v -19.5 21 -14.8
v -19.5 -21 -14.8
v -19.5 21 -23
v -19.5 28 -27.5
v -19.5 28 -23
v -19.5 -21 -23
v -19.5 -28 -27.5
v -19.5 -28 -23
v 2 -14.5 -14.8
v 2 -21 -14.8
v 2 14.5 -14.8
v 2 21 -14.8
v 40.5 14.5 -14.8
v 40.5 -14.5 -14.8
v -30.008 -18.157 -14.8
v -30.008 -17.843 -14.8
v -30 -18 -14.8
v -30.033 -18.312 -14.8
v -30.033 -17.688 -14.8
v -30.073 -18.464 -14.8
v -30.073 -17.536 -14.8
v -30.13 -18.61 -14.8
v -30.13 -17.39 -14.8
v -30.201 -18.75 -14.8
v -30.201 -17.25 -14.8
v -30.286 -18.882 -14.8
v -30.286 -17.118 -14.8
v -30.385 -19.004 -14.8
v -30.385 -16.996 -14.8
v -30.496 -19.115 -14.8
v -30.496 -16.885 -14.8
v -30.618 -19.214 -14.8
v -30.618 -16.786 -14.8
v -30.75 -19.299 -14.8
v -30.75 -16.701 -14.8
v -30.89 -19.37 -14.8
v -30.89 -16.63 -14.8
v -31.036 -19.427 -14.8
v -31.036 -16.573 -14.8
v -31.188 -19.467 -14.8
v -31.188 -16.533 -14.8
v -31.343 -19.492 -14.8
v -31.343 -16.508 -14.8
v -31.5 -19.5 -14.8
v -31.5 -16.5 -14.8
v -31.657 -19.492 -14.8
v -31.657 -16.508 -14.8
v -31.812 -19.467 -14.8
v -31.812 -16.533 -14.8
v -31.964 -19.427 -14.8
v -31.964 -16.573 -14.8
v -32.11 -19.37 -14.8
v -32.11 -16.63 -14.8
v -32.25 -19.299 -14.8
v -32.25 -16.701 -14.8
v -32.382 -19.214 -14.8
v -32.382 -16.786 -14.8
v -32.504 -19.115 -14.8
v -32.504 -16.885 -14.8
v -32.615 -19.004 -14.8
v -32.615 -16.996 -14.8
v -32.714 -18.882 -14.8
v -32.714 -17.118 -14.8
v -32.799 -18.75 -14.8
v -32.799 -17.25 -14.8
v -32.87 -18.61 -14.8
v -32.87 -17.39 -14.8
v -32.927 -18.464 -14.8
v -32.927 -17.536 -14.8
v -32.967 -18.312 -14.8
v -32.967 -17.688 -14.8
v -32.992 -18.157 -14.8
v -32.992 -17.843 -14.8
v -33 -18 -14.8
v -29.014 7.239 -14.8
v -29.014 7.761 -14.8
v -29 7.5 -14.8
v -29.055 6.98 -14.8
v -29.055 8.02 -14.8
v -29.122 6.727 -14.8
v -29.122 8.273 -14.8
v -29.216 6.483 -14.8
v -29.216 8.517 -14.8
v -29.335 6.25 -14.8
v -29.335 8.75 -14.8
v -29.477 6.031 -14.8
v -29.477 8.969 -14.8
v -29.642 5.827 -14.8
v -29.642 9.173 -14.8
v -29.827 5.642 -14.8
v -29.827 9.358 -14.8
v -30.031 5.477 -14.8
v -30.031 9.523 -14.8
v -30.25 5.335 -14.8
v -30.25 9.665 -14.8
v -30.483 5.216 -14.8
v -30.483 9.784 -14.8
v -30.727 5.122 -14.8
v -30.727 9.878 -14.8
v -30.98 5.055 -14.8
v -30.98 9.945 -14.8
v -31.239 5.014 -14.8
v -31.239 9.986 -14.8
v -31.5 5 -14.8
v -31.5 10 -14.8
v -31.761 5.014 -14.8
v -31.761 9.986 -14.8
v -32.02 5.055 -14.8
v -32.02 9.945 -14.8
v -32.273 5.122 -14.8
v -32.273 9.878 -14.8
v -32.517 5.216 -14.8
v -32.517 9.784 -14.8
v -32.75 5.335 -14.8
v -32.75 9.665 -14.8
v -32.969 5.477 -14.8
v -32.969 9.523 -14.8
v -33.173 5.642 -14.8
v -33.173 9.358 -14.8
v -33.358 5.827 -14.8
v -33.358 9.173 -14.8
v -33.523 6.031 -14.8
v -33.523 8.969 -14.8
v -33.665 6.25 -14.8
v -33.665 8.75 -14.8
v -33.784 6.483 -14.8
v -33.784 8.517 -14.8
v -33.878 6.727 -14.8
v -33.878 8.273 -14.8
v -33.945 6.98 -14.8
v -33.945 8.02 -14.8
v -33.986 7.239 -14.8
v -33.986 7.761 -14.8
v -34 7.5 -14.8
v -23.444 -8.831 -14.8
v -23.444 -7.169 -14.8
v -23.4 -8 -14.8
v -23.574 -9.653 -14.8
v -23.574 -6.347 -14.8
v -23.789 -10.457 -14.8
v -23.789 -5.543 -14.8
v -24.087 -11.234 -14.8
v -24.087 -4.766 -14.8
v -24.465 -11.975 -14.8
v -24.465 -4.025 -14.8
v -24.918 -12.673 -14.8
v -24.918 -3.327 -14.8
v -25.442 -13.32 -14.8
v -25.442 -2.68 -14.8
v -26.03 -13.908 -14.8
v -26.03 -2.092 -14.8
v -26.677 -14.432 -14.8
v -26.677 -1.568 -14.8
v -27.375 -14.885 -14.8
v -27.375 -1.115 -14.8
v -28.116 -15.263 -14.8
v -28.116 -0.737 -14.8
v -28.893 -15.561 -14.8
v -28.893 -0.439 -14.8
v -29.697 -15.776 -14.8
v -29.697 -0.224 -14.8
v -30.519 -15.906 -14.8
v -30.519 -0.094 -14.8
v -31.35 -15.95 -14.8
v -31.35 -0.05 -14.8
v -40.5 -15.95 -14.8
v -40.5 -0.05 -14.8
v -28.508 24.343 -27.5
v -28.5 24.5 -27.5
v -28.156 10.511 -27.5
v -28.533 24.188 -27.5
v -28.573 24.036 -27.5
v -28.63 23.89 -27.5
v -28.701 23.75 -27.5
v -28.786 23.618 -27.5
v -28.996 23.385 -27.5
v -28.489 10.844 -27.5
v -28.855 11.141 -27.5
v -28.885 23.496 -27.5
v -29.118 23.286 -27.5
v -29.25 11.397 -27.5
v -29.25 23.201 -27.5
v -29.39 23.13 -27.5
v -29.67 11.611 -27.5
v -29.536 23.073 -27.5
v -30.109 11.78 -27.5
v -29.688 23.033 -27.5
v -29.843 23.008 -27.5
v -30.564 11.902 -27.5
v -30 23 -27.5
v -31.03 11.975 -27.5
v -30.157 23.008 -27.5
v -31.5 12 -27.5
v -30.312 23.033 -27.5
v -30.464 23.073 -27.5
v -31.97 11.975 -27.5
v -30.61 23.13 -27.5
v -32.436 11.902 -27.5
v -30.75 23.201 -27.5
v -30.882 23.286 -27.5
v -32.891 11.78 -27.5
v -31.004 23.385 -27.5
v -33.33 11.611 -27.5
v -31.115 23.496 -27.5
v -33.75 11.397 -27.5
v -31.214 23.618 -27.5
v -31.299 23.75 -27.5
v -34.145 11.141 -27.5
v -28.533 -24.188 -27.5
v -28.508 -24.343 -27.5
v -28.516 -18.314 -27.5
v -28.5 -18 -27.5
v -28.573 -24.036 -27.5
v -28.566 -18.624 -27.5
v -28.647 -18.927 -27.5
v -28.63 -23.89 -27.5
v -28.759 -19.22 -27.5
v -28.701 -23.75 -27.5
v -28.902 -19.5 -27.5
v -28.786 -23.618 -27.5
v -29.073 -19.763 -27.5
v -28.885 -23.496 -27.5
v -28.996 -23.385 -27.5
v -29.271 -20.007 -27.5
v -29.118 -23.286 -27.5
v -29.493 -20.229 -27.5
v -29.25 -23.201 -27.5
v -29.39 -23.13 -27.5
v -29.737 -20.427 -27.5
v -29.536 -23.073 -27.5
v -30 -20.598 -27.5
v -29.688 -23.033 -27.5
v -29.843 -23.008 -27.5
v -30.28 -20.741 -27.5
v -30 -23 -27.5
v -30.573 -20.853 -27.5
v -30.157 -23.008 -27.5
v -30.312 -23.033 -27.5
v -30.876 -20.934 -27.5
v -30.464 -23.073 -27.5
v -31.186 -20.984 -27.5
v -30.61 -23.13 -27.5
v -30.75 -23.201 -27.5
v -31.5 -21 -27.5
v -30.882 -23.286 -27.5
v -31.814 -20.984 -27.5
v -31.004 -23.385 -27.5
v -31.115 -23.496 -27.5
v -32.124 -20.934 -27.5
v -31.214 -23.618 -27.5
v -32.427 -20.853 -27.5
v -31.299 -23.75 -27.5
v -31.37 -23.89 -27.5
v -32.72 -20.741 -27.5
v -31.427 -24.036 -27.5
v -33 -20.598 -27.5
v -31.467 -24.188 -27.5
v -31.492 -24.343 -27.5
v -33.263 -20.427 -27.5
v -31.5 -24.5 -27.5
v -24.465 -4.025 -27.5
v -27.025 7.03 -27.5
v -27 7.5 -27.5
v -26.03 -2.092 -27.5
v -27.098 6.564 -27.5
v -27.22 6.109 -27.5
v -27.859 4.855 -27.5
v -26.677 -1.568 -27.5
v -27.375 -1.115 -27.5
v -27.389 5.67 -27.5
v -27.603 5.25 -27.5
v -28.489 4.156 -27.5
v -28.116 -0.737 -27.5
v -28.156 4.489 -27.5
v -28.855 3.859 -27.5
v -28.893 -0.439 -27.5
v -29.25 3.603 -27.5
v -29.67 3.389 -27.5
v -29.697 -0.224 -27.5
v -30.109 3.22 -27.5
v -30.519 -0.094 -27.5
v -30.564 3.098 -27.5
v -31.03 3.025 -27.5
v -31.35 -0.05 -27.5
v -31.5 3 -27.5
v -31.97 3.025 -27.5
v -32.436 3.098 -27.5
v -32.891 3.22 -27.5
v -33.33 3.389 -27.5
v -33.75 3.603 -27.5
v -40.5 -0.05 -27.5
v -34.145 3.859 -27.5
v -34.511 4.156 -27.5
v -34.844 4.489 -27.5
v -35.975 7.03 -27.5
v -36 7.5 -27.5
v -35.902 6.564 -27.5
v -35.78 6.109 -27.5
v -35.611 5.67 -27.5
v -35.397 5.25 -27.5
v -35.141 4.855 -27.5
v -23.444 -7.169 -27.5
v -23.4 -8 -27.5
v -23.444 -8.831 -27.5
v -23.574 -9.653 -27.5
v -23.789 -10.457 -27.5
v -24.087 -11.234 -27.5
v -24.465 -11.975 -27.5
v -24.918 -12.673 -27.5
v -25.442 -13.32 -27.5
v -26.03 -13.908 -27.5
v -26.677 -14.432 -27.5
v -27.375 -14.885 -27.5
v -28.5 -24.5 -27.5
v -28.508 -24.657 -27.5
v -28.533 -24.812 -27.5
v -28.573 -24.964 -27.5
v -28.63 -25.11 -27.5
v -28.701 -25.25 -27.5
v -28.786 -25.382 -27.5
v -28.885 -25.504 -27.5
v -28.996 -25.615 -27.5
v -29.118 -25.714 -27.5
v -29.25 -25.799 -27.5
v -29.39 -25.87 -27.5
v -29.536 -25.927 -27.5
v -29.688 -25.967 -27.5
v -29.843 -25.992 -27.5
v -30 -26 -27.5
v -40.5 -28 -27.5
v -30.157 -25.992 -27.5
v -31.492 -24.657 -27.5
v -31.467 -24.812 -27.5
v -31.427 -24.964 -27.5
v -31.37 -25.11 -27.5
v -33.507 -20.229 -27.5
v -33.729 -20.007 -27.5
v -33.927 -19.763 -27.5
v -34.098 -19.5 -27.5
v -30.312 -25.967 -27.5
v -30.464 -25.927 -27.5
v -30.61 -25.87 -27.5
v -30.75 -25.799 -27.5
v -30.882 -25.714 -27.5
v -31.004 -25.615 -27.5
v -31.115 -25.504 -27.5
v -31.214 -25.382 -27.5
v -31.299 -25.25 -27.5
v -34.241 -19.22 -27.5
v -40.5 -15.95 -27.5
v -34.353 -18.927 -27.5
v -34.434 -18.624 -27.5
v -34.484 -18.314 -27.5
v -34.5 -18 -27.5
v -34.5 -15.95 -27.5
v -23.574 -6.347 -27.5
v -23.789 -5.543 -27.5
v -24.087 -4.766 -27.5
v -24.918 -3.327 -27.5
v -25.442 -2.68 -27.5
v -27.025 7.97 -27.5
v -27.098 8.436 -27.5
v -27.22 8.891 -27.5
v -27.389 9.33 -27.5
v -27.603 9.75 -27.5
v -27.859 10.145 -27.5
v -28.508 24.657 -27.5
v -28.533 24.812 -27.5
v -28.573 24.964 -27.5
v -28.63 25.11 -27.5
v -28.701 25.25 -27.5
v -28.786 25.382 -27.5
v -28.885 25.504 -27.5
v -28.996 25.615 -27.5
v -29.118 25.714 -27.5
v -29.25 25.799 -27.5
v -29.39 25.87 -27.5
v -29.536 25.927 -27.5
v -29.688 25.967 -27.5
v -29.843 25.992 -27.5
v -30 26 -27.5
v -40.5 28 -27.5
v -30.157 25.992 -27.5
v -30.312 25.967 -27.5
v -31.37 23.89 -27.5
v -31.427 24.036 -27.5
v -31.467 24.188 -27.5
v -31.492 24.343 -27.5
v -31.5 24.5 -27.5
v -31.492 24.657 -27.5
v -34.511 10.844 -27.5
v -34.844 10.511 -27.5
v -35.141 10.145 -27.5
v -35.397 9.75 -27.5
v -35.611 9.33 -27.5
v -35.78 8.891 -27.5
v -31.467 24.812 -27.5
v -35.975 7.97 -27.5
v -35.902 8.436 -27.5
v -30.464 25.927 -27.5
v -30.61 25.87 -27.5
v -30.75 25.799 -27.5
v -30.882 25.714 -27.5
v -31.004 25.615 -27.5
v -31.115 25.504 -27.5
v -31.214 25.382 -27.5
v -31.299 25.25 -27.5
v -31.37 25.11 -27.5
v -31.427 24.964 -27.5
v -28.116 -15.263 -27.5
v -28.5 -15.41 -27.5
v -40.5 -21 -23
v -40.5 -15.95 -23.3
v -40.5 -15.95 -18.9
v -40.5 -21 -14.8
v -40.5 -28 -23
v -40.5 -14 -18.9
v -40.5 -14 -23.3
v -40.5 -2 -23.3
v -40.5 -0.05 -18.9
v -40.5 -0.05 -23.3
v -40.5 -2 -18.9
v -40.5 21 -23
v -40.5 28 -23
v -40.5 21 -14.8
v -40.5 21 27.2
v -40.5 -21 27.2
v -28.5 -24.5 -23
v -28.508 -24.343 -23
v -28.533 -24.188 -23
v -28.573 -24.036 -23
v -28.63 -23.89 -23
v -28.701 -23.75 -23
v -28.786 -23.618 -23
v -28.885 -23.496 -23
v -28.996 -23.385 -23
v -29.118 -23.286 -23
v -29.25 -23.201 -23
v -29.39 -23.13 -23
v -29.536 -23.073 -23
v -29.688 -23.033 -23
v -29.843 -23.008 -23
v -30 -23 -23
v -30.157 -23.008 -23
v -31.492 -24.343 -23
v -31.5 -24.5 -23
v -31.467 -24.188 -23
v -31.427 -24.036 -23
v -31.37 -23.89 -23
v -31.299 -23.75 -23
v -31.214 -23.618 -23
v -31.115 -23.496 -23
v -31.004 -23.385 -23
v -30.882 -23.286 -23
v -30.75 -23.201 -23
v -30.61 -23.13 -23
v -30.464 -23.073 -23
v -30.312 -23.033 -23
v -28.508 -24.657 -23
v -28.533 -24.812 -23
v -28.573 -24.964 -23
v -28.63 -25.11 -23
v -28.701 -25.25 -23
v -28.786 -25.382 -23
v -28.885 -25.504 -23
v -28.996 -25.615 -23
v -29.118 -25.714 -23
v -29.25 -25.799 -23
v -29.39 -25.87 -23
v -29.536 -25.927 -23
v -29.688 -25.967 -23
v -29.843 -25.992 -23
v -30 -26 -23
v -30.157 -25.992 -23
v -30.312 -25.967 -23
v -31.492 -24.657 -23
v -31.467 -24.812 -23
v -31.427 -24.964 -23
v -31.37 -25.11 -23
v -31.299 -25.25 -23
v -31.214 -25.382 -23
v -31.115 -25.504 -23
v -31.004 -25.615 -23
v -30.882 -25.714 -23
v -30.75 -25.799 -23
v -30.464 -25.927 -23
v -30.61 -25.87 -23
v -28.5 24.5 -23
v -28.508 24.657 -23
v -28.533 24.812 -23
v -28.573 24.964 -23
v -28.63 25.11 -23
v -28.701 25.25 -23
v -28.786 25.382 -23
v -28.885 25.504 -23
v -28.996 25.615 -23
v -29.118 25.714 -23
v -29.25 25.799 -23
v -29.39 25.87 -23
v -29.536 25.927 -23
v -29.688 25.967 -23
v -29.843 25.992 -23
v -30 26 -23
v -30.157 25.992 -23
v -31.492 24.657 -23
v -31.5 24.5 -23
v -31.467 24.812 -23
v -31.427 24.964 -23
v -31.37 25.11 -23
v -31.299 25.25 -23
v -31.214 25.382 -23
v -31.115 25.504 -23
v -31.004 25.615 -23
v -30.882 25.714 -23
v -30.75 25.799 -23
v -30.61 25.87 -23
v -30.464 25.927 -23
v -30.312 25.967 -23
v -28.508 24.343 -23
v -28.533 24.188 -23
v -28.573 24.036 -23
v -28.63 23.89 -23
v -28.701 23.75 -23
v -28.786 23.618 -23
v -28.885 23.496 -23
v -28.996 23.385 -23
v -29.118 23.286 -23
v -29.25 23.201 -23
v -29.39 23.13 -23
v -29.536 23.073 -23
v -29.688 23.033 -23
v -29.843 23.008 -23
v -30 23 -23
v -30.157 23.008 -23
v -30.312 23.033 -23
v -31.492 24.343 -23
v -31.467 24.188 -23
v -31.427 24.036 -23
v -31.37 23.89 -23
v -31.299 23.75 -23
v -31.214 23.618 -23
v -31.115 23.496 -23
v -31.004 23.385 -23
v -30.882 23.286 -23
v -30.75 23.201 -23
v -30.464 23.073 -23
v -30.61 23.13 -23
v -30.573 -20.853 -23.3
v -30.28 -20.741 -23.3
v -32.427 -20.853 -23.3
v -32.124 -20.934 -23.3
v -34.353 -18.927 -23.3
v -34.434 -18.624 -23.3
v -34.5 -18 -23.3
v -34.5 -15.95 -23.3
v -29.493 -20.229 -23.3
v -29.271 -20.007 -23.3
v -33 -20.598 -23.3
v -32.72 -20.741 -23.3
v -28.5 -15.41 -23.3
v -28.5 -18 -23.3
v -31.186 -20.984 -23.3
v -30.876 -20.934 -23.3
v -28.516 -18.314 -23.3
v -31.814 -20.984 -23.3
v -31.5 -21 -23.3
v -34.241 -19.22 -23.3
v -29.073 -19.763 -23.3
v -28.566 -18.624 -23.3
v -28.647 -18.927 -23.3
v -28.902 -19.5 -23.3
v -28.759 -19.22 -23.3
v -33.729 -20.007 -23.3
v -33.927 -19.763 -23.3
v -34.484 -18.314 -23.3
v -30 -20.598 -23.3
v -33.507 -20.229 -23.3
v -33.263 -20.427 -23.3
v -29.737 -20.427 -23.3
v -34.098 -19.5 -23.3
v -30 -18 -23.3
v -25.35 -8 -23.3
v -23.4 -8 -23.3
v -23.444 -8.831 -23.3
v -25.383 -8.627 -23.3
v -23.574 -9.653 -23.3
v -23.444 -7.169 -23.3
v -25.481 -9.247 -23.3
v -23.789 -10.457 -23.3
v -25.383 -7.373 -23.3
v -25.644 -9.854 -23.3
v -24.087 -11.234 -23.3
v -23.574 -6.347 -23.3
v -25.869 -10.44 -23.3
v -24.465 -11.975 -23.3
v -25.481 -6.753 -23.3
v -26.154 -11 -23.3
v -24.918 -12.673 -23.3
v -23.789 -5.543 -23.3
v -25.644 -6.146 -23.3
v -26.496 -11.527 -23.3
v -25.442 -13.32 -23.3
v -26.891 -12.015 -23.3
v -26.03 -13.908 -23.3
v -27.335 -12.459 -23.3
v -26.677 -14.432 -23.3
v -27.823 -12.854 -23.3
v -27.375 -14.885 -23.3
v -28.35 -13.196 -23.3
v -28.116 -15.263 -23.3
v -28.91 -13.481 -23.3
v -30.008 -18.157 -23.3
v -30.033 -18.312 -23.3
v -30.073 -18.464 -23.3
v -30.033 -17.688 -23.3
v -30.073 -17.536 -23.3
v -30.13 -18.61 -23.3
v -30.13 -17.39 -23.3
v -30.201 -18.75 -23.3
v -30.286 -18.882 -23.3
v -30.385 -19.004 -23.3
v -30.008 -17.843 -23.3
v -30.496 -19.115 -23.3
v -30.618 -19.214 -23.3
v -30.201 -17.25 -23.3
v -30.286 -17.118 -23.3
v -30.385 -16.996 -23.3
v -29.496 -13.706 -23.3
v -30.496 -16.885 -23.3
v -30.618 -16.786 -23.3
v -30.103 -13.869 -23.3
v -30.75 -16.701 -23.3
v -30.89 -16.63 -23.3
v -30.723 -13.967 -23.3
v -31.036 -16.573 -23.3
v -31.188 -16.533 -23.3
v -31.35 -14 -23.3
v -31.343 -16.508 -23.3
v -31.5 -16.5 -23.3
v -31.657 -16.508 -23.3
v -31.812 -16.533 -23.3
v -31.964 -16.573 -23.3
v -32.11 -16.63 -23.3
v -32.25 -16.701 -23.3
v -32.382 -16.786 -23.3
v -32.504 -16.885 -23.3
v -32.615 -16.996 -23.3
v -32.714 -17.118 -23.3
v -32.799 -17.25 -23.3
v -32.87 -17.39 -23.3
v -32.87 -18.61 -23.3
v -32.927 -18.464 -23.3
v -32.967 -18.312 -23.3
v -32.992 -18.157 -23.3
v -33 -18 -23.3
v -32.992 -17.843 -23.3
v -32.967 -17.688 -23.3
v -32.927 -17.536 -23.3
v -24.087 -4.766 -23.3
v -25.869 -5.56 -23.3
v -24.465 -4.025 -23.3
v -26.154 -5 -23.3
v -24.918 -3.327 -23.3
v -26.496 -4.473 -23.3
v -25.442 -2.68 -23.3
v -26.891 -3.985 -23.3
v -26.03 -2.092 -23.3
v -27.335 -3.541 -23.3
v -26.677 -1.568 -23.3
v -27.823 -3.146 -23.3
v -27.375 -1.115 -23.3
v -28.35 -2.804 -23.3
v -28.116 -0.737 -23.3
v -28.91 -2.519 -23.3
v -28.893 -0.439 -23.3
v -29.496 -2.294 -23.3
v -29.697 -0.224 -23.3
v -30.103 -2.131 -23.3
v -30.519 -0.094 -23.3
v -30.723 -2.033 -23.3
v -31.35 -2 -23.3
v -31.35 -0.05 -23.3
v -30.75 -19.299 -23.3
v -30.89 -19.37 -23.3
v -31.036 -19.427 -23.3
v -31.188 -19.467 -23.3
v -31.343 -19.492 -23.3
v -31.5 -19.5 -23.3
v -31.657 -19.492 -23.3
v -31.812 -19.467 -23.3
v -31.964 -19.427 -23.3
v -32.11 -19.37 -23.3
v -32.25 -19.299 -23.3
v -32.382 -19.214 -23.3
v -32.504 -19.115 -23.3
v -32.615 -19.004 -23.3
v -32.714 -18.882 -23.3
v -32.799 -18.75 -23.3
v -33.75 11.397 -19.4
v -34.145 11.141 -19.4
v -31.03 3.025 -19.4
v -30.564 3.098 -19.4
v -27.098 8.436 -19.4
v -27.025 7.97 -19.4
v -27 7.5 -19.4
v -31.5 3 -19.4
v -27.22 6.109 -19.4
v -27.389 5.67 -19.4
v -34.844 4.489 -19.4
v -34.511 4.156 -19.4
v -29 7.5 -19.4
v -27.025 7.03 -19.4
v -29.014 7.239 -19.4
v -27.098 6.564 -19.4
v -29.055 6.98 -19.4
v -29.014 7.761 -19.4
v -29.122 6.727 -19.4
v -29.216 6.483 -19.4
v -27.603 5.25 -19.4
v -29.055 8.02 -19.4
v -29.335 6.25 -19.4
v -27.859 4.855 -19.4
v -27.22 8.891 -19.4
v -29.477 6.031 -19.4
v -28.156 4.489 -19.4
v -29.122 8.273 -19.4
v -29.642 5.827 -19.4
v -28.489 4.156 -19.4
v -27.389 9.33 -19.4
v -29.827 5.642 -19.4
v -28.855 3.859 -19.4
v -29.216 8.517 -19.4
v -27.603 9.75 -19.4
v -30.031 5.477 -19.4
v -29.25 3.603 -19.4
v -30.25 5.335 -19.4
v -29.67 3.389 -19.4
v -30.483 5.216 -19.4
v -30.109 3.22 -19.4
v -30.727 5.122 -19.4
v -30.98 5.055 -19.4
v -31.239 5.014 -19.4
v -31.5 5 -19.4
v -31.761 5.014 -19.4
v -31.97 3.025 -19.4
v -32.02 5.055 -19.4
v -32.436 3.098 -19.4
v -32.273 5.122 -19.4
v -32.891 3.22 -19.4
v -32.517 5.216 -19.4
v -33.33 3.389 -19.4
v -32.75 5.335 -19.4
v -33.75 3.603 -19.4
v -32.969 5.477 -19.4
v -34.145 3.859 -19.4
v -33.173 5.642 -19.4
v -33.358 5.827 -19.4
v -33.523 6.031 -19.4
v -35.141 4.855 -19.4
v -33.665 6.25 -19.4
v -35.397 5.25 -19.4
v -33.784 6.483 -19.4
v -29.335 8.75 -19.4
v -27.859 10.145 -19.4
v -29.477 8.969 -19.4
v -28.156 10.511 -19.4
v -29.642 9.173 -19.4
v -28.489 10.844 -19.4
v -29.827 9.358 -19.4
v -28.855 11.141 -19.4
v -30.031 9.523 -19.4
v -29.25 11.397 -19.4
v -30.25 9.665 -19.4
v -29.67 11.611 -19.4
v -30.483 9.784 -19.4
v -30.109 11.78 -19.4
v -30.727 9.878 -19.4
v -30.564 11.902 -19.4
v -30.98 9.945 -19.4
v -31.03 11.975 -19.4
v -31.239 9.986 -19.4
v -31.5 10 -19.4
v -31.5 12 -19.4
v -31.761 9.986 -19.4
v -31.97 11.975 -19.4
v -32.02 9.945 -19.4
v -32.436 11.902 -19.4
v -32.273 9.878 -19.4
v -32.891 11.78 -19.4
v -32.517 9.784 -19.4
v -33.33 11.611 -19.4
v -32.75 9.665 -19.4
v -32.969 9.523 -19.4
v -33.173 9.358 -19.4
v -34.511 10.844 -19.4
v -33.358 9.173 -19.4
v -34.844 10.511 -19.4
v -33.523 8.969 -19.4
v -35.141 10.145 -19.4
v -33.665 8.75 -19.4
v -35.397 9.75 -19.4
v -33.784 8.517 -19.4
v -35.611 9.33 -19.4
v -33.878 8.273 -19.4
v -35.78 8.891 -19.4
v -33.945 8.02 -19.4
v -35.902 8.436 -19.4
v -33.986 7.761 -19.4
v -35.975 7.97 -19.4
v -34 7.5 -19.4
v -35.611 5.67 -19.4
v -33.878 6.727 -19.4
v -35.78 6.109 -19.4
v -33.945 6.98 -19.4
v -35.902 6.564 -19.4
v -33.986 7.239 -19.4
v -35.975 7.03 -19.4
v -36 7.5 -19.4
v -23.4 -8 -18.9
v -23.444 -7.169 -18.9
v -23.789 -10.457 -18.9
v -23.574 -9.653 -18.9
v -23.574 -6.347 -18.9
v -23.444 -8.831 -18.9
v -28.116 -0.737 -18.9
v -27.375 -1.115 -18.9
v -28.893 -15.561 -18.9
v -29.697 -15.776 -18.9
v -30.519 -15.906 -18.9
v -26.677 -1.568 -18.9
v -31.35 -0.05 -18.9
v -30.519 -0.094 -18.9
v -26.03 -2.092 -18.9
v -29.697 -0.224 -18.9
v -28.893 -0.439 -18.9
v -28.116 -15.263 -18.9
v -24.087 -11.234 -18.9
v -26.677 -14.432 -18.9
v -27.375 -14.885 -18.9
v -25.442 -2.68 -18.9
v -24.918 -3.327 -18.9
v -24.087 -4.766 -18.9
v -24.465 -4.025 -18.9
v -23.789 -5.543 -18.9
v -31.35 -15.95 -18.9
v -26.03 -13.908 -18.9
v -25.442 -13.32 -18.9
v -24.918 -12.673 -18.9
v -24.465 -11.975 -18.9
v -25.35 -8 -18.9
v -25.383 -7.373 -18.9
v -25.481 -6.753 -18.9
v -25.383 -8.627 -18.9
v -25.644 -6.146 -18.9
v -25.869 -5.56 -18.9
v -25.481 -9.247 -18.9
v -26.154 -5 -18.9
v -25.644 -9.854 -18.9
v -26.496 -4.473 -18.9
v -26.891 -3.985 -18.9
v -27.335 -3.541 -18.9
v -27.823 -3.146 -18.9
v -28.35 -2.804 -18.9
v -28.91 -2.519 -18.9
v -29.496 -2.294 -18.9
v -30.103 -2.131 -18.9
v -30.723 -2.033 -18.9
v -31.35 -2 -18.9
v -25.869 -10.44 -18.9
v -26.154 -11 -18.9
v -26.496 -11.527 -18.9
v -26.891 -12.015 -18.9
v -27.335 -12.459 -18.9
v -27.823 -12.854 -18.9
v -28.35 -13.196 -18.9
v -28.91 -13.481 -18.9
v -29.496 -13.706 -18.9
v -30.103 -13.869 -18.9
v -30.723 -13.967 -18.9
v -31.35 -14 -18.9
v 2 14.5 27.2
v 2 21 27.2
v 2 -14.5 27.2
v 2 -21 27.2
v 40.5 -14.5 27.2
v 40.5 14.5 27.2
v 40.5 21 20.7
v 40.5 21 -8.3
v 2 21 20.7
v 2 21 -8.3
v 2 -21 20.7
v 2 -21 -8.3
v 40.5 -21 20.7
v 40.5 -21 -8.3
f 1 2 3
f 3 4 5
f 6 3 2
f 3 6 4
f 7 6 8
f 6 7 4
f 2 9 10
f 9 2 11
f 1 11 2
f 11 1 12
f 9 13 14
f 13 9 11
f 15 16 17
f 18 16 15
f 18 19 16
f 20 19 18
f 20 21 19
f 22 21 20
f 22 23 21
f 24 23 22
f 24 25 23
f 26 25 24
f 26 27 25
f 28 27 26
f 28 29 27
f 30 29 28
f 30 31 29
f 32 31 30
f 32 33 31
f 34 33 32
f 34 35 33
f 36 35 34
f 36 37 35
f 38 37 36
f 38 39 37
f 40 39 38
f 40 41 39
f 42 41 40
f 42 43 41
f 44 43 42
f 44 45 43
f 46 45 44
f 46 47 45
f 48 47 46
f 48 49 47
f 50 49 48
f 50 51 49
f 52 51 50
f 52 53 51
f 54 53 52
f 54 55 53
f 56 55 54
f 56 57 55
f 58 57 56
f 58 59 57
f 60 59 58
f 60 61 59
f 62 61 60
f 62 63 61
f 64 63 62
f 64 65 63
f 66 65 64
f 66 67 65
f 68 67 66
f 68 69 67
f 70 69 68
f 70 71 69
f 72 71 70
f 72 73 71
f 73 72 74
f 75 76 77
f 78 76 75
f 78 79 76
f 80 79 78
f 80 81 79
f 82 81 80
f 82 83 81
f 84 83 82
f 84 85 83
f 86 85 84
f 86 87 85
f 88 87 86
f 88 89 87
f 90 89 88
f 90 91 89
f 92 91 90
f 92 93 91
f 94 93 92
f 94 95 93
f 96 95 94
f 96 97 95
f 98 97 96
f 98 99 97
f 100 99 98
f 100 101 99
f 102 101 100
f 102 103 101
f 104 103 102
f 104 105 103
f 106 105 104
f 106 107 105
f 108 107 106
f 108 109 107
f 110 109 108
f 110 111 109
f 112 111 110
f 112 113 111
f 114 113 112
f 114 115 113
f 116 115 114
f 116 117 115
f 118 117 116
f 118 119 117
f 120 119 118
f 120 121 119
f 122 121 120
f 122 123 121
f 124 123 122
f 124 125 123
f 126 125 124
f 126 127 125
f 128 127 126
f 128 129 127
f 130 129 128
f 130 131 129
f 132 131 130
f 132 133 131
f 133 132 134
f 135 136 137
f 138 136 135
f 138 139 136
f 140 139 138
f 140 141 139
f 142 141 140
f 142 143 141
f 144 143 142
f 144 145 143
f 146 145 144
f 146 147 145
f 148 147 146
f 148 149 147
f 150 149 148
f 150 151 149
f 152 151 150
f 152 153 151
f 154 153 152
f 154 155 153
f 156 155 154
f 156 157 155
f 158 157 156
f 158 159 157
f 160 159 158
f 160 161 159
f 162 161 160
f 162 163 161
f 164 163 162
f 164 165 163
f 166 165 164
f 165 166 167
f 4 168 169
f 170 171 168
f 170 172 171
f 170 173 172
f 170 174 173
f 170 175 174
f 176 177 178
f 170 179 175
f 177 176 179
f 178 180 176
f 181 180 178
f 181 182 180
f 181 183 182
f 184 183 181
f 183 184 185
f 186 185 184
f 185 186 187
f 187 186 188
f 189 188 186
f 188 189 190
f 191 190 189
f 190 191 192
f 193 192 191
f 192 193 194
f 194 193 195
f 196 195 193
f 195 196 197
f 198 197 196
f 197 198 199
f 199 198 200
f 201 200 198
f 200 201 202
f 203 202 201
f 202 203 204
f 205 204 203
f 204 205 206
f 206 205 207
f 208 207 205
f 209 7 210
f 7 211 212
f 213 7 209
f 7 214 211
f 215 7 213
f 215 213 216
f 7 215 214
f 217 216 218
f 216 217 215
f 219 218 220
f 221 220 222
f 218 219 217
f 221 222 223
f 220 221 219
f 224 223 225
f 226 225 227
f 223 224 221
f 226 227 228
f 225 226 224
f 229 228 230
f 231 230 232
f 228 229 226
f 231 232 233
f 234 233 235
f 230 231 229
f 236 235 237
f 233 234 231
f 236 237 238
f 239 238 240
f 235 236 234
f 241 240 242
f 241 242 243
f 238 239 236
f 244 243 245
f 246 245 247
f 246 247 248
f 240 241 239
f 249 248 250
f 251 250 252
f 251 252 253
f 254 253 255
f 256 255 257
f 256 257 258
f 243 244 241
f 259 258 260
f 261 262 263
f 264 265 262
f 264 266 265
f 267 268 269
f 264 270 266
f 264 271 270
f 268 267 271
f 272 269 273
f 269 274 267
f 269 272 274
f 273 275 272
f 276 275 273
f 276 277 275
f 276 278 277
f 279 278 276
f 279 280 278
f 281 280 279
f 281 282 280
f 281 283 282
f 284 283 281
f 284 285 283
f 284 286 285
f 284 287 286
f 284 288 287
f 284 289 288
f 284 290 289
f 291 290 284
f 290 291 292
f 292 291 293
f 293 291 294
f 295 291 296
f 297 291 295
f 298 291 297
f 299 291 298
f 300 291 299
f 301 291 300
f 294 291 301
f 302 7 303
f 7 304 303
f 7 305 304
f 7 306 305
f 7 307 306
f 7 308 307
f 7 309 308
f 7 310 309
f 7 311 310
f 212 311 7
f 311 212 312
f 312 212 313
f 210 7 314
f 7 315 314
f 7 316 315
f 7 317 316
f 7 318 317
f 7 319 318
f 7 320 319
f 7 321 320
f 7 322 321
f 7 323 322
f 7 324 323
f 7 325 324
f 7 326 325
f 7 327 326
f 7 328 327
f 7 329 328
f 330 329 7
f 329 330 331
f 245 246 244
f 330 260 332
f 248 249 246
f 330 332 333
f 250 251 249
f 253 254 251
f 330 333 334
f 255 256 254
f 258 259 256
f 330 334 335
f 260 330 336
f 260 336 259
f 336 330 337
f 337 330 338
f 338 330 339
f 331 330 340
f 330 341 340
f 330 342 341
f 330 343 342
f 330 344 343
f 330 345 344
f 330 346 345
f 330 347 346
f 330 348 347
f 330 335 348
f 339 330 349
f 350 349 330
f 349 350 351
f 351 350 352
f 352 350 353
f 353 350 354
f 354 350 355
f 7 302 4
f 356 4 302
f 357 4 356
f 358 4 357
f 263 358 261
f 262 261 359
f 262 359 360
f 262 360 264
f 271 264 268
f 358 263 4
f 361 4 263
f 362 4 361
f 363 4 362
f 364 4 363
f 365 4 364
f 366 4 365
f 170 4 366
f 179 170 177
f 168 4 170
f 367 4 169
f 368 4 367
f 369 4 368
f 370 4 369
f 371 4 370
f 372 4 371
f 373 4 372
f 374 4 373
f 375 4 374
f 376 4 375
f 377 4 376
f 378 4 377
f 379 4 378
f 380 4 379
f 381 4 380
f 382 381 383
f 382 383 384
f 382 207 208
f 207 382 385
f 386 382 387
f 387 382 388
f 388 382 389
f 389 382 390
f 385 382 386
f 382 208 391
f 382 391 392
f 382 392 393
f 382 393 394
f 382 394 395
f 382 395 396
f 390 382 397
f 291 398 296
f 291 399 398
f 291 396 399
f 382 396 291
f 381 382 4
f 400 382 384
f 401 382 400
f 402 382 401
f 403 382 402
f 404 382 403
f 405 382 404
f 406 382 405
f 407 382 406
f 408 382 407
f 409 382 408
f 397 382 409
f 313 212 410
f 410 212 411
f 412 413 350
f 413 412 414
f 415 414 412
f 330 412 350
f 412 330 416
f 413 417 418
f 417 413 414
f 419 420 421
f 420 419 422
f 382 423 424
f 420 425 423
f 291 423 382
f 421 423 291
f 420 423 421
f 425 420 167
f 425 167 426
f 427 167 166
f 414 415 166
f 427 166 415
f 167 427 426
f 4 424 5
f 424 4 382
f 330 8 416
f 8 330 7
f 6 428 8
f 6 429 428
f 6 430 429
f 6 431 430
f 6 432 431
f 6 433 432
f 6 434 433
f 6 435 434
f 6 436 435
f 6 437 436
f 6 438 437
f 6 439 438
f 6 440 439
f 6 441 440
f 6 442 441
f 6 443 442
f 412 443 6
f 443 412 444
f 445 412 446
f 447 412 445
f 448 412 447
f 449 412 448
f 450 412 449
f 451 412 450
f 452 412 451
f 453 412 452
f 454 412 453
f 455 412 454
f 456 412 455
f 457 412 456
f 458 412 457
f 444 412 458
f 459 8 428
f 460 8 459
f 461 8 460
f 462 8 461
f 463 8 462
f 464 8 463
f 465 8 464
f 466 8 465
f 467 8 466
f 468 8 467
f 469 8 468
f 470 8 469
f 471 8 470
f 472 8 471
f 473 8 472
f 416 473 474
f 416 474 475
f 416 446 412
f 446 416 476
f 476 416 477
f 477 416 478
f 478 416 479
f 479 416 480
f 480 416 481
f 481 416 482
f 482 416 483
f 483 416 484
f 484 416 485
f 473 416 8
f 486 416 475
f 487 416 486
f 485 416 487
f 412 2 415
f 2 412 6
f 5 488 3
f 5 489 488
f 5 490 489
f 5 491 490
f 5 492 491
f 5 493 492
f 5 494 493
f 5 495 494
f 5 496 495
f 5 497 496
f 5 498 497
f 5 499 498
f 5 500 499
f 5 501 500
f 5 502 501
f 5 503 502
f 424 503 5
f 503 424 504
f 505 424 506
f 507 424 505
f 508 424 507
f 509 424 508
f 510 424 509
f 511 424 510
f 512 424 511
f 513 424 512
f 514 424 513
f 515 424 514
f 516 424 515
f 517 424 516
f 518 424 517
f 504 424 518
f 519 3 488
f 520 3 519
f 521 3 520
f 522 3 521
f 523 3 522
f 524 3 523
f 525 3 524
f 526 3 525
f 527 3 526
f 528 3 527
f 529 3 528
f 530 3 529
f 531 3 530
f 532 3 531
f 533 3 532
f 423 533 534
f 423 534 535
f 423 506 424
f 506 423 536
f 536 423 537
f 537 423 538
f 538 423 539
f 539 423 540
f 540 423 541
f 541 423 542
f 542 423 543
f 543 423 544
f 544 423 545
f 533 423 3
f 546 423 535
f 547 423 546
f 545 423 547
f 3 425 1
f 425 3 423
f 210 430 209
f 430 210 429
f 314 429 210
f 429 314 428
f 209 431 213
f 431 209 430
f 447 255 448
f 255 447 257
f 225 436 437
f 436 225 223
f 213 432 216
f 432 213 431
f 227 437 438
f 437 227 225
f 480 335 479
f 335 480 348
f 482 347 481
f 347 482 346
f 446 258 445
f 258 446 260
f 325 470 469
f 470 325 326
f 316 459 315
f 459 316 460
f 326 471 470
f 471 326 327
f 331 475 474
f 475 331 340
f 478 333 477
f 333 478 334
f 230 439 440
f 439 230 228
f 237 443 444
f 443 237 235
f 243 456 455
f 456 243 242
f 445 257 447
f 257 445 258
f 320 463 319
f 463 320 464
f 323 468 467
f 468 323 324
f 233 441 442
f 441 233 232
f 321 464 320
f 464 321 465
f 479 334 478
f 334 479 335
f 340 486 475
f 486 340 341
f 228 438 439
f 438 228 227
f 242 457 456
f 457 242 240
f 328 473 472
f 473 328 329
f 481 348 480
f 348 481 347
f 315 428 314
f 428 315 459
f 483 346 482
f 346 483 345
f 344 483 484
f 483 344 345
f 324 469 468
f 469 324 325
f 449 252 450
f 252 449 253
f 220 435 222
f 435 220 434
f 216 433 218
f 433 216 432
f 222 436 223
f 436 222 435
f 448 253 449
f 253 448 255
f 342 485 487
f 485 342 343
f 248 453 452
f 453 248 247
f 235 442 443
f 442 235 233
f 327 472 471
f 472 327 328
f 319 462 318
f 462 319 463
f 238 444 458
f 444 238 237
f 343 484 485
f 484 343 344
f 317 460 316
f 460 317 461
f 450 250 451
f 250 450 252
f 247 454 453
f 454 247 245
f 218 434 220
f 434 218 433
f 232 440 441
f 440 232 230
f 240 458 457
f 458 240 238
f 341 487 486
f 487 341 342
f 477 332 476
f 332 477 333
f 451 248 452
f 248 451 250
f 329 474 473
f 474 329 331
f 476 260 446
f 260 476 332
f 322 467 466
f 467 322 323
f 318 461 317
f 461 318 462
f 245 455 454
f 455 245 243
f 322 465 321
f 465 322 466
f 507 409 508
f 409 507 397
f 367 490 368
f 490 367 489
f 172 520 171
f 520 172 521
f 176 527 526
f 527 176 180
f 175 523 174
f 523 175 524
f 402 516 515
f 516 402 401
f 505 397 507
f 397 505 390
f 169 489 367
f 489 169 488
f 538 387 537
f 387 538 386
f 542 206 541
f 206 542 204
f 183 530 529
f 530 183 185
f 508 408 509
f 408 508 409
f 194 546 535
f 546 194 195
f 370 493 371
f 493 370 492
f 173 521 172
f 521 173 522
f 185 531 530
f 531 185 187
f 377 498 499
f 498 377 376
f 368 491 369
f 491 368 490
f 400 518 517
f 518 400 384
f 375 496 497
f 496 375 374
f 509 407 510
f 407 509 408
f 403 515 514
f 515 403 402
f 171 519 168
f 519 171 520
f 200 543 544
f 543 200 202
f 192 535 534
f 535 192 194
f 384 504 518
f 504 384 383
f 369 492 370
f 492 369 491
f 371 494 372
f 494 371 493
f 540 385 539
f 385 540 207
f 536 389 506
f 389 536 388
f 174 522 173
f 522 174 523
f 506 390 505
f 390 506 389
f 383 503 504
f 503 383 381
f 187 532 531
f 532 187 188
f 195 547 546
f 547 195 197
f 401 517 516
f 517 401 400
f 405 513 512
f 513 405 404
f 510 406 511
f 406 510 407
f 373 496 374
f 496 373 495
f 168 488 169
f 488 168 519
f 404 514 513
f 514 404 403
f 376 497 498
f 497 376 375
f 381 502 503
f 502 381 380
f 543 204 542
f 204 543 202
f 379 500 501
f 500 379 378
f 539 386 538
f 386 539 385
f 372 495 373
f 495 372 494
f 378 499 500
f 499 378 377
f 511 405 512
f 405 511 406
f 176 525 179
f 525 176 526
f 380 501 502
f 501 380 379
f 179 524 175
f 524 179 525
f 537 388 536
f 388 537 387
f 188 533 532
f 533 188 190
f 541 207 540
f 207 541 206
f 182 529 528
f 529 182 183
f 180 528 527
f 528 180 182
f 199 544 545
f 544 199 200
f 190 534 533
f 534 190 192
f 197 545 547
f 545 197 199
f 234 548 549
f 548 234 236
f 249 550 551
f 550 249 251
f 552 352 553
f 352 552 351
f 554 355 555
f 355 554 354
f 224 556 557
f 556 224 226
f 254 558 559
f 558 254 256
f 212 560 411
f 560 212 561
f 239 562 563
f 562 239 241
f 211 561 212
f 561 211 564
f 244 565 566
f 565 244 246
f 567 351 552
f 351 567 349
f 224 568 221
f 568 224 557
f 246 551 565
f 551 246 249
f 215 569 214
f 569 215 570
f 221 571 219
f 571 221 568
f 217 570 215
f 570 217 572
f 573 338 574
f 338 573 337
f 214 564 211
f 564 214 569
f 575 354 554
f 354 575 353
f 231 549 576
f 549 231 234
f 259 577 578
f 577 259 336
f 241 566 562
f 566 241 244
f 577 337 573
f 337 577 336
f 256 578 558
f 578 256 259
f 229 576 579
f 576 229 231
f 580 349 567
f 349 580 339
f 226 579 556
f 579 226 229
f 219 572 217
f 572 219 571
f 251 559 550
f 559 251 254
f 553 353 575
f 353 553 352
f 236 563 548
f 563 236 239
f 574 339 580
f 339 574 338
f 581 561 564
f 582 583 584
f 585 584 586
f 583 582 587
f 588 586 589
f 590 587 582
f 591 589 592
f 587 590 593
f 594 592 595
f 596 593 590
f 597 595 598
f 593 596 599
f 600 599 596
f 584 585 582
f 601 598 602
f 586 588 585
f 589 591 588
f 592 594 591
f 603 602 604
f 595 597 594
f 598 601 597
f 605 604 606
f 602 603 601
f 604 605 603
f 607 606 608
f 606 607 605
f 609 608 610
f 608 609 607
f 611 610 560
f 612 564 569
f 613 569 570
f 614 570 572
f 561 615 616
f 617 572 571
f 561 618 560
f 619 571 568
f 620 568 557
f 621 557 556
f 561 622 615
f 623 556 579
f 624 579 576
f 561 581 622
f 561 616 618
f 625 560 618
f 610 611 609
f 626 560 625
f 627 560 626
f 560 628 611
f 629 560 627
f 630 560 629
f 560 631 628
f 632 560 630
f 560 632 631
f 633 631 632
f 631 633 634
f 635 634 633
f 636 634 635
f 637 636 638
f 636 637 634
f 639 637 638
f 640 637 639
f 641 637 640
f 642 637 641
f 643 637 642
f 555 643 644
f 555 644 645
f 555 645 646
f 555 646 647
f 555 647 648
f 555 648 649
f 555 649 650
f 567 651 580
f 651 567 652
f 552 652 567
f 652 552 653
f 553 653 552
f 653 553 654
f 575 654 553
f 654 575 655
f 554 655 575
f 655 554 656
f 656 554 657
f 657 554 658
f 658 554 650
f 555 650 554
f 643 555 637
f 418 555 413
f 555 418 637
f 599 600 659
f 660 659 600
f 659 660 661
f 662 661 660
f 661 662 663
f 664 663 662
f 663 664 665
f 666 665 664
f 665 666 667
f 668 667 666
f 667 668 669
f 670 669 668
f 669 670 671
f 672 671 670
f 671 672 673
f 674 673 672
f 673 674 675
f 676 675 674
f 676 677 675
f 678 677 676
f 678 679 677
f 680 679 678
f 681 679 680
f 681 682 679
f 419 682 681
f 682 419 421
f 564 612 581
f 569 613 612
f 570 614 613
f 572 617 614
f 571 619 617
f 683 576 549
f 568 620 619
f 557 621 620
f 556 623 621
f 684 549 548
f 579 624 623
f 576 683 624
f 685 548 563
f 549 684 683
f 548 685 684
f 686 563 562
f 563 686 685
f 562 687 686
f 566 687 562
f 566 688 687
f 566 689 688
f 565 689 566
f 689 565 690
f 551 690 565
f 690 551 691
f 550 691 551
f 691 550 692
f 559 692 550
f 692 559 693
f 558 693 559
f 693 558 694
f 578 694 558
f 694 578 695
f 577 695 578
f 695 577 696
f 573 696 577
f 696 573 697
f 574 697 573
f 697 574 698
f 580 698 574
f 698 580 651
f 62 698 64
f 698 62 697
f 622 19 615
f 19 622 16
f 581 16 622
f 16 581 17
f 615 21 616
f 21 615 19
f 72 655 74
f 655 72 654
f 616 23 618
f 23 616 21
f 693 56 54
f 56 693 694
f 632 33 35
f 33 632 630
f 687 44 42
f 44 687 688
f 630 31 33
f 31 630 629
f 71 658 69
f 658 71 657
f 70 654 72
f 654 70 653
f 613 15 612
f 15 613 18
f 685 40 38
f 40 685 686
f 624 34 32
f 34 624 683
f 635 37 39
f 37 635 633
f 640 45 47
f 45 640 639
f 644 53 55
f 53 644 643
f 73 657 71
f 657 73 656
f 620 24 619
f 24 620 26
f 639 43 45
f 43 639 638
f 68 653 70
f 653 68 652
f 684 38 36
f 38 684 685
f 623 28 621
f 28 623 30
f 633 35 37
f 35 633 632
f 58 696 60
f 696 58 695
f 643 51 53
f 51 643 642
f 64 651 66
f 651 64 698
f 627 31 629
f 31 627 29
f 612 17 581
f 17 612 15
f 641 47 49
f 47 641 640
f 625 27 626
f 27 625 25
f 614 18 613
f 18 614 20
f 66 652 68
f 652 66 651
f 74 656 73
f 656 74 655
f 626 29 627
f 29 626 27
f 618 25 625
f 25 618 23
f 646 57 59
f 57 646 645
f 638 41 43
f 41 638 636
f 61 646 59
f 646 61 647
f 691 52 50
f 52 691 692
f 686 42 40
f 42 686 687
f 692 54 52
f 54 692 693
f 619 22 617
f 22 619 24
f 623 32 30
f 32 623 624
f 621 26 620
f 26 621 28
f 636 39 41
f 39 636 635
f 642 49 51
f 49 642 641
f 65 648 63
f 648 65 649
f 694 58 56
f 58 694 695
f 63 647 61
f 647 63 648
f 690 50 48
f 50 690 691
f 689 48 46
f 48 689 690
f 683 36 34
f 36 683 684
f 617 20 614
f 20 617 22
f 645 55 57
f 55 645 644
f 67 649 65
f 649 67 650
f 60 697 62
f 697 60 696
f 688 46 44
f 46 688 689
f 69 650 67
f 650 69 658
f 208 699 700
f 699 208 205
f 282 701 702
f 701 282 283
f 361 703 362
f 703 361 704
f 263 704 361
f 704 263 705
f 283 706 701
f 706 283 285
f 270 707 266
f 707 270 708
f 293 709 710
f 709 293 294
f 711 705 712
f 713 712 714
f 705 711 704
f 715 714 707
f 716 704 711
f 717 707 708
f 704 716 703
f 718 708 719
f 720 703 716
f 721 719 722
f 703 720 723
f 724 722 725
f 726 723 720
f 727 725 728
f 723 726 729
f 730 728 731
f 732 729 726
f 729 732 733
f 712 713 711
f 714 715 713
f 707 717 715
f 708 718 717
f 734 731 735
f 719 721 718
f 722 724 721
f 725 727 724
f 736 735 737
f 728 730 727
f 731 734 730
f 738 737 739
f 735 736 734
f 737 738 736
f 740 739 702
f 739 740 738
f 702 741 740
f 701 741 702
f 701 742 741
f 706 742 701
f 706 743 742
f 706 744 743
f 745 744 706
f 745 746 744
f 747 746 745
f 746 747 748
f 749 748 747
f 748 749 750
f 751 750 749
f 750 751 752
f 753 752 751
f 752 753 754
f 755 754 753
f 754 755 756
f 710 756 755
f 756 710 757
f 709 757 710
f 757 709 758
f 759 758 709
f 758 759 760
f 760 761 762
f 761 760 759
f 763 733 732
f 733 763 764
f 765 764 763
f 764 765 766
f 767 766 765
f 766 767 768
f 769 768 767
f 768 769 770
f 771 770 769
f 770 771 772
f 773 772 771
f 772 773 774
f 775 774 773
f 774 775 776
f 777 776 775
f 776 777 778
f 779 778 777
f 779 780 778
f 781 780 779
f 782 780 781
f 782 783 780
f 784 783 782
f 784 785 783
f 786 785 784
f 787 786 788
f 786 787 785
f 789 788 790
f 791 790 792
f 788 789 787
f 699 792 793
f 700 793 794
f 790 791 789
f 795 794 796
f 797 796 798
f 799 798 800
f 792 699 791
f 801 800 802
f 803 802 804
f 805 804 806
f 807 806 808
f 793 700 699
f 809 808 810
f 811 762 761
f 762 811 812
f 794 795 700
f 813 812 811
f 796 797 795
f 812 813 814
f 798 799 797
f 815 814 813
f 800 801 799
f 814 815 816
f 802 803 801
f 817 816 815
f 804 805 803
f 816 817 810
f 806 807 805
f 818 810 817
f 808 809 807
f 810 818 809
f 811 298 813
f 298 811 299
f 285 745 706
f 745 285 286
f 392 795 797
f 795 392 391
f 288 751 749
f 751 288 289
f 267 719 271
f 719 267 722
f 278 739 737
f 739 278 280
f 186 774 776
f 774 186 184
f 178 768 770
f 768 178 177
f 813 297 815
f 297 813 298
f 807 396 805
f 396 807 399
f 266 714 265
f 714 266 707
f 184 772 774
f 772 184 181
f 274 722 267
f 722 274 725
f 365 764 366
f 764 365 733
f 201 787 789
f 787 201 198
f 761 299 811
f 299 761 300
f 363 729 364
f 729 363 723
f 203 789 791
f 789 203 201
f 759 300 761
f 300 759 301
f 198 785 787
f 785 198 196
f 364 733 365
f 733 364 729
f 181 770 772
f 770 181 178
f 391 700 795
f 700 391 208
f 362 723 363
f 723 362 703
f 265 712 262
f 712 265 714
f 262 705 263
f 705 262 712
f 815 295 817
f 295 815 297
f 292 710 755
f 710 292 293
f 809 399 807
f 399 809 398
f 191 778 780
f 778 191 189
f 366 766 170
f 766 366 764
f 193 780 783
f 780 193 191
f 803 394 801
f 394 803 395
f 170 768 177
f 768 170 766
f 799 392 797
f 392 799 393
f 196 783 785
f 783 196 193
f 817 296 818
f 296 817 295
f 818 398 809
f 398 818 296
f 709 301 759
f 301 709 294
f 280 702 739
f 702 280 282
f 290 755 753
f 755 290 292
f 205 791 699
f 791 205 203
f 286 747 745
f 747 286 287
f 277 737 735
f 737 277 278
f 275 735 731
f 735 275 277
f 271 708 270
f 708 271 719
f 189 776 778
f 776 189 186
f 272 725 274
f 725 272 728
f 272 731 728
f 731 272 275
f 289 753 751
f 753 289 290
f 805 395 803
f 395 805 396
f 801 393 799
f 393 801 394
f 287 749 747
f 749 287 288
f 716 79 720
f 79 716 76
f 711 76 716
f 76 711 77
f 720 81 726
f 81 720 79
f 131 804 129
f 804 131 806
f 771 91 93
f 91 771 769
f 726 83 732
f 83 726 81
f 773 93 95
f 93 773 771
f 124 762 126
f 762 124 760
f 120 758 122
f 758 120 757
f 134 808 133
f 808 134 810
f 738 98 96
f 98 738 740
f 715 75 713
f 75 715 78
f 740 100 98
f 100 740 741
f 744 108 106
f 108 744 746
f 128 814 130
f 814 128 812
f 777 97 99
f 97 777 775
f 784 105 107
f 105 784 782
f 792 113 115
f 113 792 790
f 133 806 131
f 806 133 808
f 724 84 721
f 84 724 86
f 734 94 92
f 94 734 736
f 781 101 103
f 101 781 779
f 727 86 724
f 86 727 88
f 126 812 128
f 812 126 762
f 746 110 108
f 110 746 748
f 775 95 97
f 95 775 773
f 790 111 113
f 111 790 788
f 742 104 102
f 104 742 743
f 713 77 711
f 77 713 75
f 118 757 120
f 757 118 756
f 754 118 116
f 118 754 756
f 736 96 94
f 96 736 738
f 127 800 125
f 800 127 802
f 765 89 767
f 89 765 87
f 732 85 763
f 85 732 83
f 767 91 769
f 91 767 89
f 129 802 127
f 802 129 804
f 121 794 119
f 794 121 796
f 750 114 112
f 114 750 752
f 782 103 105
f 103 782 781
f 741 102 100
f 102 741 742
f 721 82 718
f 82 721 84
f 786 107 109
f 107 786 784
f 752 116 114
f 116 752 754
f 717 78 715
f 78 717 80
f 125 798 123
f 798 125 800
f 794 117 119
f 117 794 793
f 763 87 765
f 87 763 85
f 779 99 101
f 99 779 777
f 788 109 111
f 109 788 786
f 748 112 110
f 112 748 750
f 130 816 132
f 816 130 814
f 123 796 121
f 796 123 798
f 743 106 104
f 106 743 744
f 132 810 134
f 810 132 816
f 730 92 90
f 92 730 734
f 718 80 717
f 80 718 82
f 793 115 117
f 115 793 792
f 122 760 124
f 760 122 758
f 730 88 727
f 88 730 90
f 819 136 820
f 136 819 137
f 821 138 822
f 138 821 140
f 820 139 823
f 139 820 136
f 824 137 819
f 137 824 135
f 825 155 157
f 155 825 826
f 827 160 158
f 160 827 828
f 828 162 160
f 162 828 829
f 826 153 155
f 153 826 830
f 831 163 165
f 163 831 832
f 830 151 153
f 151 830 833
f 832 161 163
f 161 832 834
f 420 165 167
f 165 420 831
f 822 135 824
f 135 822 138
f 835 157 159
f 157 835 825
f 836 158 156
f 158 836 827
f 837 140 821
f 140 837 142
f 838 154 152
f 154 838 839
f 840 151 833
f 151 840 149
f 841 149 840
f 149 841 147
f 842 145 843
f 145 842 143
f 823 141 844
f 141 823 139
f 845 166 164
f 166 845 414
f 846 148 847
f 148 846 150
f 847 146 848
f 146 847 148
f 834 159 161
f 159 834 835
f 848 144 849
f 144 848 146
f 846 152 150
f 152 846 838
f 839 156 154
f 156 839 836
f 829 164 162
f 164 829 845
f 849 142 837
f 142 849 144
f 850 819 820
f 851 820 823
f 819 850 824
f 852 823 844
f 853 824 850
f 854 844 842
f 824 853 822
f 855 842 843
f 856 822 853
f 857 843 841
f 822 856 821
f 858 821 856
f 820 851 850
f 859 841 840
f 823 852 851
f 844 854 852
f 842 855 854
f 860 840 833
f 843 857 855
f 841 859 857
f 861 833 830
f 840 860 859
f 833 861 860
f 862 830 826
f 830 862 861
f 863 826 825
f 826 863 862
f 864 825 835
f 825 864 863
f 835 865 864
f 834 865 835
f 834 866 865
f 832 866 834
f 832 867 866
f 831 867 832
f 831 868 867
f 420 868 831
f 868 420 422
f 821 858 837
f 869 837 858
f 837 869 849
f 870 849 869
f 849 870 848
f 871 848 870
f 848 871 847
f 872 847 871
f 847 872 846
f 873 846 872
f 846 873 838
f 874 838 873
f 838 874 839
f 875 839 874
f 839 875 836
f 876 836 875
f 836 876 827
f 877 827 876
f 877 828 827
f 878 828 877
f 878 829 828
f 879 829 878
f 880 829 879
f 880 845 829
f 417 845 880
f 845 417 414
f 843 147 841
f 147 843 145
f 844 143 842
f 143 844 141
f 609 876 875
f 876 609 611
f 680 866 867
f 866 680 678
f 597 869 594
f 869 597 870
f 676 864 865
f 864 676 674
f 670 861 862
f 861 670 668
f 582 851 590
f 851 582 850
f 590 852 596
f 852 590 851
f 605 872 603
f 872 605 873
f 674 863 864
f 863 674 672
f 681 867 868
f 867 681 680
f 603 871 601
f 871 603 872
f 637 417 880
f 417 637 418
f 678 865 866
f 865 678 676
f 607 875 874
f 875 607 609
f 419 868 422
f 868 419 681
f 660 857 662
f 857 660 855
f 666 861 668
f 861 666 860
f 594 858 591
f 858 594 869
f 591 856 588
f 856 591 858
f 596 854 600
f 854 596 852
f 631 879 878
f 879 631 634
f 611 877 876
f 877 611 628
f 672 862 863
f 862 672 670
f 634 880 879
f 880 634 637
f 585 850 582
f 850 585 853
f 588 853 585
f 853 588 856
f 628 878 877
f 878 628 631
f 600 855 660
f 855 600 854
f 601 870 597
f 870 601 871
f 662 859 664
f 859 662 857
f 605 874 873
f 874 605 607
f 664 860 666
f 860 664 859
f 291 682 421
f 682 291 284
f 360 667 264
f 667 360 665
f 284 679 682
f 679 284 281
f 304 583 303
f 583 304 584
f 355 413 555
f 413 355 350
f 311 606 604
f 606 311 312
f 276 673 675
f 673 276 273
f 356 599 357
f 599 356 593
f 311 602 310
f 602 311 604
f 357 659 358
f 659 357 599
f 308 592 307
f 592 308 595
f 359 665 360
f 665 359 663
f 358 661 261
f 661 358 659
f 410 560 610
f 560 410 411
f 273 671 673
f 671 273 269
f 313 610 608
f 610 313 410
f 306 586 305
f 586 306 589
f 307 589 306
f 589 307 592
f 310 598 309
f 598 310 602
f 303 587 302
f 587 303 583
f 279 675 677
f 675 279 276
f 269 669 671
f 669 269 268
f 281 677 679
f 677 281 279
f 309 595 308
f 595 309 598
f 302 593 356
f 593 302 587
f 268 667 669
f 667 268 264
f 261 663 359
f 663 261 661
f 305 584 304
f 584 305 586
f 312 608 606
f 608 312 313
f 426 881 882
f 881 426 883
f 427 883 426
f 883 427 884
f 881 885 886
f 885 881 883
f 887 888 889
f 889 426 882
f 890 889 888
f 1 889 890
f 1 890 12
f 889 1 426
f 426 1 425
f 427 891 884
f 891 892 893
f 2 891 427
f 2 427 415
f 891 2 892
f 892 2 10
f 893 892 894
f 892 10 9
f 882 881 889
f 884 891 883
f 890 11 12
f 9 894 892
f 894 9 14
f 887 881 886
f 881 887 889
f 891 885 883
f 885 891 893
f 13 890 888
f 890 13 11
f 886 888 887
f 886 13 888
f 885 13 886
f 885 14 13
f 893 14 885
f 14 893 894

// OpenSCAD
//Buffer-Local Properties for jEdit, www.jedit.org
//:indentSize=4:tabSize=4:collapseFolds=true:folding=explicit:mode=c:

//
// (c) Andreas Thorn (andreas.thorn@gmail.com)
//	Thingiverse: 
//	
// Licence: Attribution - Share Alike - Creative Commons
//


//{{{ Info, Changelog
/*************************************************************************************************
Custom mount for Bulldog XL extruder. Integrated axial fan.
(Original mount comes with a pretty exotic radial fan which is very prone to
dying.)

Changelog;
101	Visual representation of screws added but disabled.
100	Initial work. The Bulldog is simplified with only the important dimensions.
**************************************************************************************************/
//}}}
//{{{ Variables and constants
shim = 0.1;								// used overlap meshes/cutouts
$fn = 60;

dim=[40,40];
//}}}

module bulldogxl() {
translate([-81/2,-56/2,-55/2]) {
//projection(cut=true) {
//translate([-81/2,-56/2,-0.5]) {

//{{{ Hotend clamp
difference() {
	// Full block with union instead of using cutaways
	*color([0.5,1.0,0.7,1.0])
	union() {
		translate([0,0,0])
		cube([21,56,4.5]);

		translate([0,(56-42)/2,4.5])
		cube([21,42,12.7-4.5]);
	}

	// Main block
	color([0.5,0.5,0.5,1.0])
	translate([0,0,0])
	cube([21,56,12.7]);

	// Bottom cutaway. We use cutaways to indicate material removal. Just for fun.
	color([1.0,1.0,0.3,1.0])
	translate([-shim,-shim,4.5])
	cube([21+(2*shim),((56-42)/2)+shim,(12.7-4.5)+shim]);

	// Top cutaway. We use cutaways to indicate material removal. Just for fun.
	color([1.0,1.0,0.3,1.0])
	translate([-shim,56-((56-42)/2),4.5])
	cube([21+(2*shim),((56-42)/2)+shim,(12.7-4.5)+shim]);

	// Bottom mount screw hole
	translate([21/2,3.5,-shim])
	cylinder(d=3,h=4.5+(2*shim));

	// Top mount screw hole
	translate([21/2,56-3.5,-shim])
	cylinder(d=3,h=4.5+(2*shim));

	color([1.0,1.0,0.3,1.0])
	hull() {
		// Small hexbolt screw hole
		translate([9,10,-shim])
		cylinder(d=6,h=4.1+(2*shim));
		
		translate([9,10+5,-shim])
		cylinder(d=6,h=4.1+(2*shim));
	}
	translate([7.5+(3/2),10,-shim])
	cylinder(d=3,h=12.7+(2*shim));

	// Big hexbolt screw hole
	color([1.0,0.7,0.3,1.0])
	translate([4.5+(9/2),56-20.5,-shim])
	cylinder(d=9,h=8+(2*shim));

	translate([6.5+(5/2),56-20.5,-shim])
	cylinder(d=5,h=12.7+(2*shim));

	color([1.0,1.0,0.3,1.0])
	hull() {
	// Hotend hole top
	translate([4.5+(9.3/2),56-36,12.7-4.1])
	cylinder(d=15.9,h=4.1+(2*shim));

	translate([-5,56-36,12.7-4.1])
	cylinder(d=15.9,h=4.1+(2*shim));
	}

	color([1.0,1.0,0.3,1.0])
	hull() {
	// Hotend hole middle
	translate([4.5+(9.3/2),56-36,12.7-4.1-4.5-shim])
	cylinder(d=12,h=4.5+(2*shim));

	translate([-5,56-36,12.7-4.1-4.5-shim])
	cylinder(d=12,h=4.5+(2*shim));
	}

	color([1.0,1.0,0.3,1.0])
	hull() {
	// Hotend hole bottom
	translate([4.5+(9.3/2),56-36,-shim])
	cylinder(d=15.9,h=4.1+(2*shim));

	translate([-5,56-36,-shim])
	cylinder(d=15.9,h=4.1+(2*shim));
	}

}
//}}}

//{{{ Drive block
translate([0,(56-42)/2,12.7])
color([0.7,0.7,0.7,1.0])
union() {
	translate([0,0,0])
	cube([22.5,42,42]);
}
//}}}
//{{{ Gearbox cover
translate([22.5,(56-42)/2,12.7])
color([0.2,0.2,0.2,1.0])
union() {
	translate([0,0,0])
	cube([20,42,42]);
}
//}}}
//{{{ Gearbox metal flange
translate([22.5+20,(56-42)/2,12.7])
color([0.7,0.7,0.7,1.0])
hull() {
	translate([0,(42-29)/2,0])
	cube([4.5,29,42]);

	translate([0,0,(42-29)/2])
	cube([4.5,42,29]);
}
//}}}
//{{{ Stepper motor
translate([22.5+20+4.5,(56-42)/2,12.7])
color([0.5,0.5,0.5,1.0])
hull() {
	translate([0,(42-29)/2,0])
	cube([34,29,42]);

	translate([0,0,(42-29)/2])
	cube([34,42,29]);
}
//}}}

//{{{ Screw holes visualization
// For making screw holes in the mount
*translate([0,0,0])
mirror([0,0,1])
union() {
	// Bottom mount screw hole
	translate([21/2,3.5,0])
	cylinder(d=3+0.3,h=40);

	// Top mount screw hole
	translate([21/2,56-3.5,0])
	cylinder(d=3+0.3,h=40);

	// Small hexbolt screw hole
	*translate([9,10,-shim])
	cylinder(d=6+0.3,h=4.1+(2*shim));

	// Big hexbolt screw hole
	*translate([4.5+(9/2),56-20.5,-shim])
	cylinder(d=9+0.3,h=40);
	
	// Hotend hole
	*translate([4.5+(9.3/2),56-36,0])
	cylinder(d=18.5+1.5,h=40);
}
//}}}
}
}

bulldogxl();

//{{{ Module polyhole
// http://hydraraptor.blogspot.se/2011/02/polyholes.html
module polyhole(h, d) {
    n = max(round(2 * d),3);
    rotate([0,0,180])
        cylinder(h = h, r = (d / 2) / cos (180 / n), $fn = n);
}
//}}}
//{{{ Module cylinda
module cylinda(diam=1,height=1,fn=60,polyhole=0)
{
	if (polyhole==1)
	{
		polyhole(h=height,d=diam);
	} else {
		cylinder(r=diam/2,h=height,$fn=fn);
	}
}
//}}}
